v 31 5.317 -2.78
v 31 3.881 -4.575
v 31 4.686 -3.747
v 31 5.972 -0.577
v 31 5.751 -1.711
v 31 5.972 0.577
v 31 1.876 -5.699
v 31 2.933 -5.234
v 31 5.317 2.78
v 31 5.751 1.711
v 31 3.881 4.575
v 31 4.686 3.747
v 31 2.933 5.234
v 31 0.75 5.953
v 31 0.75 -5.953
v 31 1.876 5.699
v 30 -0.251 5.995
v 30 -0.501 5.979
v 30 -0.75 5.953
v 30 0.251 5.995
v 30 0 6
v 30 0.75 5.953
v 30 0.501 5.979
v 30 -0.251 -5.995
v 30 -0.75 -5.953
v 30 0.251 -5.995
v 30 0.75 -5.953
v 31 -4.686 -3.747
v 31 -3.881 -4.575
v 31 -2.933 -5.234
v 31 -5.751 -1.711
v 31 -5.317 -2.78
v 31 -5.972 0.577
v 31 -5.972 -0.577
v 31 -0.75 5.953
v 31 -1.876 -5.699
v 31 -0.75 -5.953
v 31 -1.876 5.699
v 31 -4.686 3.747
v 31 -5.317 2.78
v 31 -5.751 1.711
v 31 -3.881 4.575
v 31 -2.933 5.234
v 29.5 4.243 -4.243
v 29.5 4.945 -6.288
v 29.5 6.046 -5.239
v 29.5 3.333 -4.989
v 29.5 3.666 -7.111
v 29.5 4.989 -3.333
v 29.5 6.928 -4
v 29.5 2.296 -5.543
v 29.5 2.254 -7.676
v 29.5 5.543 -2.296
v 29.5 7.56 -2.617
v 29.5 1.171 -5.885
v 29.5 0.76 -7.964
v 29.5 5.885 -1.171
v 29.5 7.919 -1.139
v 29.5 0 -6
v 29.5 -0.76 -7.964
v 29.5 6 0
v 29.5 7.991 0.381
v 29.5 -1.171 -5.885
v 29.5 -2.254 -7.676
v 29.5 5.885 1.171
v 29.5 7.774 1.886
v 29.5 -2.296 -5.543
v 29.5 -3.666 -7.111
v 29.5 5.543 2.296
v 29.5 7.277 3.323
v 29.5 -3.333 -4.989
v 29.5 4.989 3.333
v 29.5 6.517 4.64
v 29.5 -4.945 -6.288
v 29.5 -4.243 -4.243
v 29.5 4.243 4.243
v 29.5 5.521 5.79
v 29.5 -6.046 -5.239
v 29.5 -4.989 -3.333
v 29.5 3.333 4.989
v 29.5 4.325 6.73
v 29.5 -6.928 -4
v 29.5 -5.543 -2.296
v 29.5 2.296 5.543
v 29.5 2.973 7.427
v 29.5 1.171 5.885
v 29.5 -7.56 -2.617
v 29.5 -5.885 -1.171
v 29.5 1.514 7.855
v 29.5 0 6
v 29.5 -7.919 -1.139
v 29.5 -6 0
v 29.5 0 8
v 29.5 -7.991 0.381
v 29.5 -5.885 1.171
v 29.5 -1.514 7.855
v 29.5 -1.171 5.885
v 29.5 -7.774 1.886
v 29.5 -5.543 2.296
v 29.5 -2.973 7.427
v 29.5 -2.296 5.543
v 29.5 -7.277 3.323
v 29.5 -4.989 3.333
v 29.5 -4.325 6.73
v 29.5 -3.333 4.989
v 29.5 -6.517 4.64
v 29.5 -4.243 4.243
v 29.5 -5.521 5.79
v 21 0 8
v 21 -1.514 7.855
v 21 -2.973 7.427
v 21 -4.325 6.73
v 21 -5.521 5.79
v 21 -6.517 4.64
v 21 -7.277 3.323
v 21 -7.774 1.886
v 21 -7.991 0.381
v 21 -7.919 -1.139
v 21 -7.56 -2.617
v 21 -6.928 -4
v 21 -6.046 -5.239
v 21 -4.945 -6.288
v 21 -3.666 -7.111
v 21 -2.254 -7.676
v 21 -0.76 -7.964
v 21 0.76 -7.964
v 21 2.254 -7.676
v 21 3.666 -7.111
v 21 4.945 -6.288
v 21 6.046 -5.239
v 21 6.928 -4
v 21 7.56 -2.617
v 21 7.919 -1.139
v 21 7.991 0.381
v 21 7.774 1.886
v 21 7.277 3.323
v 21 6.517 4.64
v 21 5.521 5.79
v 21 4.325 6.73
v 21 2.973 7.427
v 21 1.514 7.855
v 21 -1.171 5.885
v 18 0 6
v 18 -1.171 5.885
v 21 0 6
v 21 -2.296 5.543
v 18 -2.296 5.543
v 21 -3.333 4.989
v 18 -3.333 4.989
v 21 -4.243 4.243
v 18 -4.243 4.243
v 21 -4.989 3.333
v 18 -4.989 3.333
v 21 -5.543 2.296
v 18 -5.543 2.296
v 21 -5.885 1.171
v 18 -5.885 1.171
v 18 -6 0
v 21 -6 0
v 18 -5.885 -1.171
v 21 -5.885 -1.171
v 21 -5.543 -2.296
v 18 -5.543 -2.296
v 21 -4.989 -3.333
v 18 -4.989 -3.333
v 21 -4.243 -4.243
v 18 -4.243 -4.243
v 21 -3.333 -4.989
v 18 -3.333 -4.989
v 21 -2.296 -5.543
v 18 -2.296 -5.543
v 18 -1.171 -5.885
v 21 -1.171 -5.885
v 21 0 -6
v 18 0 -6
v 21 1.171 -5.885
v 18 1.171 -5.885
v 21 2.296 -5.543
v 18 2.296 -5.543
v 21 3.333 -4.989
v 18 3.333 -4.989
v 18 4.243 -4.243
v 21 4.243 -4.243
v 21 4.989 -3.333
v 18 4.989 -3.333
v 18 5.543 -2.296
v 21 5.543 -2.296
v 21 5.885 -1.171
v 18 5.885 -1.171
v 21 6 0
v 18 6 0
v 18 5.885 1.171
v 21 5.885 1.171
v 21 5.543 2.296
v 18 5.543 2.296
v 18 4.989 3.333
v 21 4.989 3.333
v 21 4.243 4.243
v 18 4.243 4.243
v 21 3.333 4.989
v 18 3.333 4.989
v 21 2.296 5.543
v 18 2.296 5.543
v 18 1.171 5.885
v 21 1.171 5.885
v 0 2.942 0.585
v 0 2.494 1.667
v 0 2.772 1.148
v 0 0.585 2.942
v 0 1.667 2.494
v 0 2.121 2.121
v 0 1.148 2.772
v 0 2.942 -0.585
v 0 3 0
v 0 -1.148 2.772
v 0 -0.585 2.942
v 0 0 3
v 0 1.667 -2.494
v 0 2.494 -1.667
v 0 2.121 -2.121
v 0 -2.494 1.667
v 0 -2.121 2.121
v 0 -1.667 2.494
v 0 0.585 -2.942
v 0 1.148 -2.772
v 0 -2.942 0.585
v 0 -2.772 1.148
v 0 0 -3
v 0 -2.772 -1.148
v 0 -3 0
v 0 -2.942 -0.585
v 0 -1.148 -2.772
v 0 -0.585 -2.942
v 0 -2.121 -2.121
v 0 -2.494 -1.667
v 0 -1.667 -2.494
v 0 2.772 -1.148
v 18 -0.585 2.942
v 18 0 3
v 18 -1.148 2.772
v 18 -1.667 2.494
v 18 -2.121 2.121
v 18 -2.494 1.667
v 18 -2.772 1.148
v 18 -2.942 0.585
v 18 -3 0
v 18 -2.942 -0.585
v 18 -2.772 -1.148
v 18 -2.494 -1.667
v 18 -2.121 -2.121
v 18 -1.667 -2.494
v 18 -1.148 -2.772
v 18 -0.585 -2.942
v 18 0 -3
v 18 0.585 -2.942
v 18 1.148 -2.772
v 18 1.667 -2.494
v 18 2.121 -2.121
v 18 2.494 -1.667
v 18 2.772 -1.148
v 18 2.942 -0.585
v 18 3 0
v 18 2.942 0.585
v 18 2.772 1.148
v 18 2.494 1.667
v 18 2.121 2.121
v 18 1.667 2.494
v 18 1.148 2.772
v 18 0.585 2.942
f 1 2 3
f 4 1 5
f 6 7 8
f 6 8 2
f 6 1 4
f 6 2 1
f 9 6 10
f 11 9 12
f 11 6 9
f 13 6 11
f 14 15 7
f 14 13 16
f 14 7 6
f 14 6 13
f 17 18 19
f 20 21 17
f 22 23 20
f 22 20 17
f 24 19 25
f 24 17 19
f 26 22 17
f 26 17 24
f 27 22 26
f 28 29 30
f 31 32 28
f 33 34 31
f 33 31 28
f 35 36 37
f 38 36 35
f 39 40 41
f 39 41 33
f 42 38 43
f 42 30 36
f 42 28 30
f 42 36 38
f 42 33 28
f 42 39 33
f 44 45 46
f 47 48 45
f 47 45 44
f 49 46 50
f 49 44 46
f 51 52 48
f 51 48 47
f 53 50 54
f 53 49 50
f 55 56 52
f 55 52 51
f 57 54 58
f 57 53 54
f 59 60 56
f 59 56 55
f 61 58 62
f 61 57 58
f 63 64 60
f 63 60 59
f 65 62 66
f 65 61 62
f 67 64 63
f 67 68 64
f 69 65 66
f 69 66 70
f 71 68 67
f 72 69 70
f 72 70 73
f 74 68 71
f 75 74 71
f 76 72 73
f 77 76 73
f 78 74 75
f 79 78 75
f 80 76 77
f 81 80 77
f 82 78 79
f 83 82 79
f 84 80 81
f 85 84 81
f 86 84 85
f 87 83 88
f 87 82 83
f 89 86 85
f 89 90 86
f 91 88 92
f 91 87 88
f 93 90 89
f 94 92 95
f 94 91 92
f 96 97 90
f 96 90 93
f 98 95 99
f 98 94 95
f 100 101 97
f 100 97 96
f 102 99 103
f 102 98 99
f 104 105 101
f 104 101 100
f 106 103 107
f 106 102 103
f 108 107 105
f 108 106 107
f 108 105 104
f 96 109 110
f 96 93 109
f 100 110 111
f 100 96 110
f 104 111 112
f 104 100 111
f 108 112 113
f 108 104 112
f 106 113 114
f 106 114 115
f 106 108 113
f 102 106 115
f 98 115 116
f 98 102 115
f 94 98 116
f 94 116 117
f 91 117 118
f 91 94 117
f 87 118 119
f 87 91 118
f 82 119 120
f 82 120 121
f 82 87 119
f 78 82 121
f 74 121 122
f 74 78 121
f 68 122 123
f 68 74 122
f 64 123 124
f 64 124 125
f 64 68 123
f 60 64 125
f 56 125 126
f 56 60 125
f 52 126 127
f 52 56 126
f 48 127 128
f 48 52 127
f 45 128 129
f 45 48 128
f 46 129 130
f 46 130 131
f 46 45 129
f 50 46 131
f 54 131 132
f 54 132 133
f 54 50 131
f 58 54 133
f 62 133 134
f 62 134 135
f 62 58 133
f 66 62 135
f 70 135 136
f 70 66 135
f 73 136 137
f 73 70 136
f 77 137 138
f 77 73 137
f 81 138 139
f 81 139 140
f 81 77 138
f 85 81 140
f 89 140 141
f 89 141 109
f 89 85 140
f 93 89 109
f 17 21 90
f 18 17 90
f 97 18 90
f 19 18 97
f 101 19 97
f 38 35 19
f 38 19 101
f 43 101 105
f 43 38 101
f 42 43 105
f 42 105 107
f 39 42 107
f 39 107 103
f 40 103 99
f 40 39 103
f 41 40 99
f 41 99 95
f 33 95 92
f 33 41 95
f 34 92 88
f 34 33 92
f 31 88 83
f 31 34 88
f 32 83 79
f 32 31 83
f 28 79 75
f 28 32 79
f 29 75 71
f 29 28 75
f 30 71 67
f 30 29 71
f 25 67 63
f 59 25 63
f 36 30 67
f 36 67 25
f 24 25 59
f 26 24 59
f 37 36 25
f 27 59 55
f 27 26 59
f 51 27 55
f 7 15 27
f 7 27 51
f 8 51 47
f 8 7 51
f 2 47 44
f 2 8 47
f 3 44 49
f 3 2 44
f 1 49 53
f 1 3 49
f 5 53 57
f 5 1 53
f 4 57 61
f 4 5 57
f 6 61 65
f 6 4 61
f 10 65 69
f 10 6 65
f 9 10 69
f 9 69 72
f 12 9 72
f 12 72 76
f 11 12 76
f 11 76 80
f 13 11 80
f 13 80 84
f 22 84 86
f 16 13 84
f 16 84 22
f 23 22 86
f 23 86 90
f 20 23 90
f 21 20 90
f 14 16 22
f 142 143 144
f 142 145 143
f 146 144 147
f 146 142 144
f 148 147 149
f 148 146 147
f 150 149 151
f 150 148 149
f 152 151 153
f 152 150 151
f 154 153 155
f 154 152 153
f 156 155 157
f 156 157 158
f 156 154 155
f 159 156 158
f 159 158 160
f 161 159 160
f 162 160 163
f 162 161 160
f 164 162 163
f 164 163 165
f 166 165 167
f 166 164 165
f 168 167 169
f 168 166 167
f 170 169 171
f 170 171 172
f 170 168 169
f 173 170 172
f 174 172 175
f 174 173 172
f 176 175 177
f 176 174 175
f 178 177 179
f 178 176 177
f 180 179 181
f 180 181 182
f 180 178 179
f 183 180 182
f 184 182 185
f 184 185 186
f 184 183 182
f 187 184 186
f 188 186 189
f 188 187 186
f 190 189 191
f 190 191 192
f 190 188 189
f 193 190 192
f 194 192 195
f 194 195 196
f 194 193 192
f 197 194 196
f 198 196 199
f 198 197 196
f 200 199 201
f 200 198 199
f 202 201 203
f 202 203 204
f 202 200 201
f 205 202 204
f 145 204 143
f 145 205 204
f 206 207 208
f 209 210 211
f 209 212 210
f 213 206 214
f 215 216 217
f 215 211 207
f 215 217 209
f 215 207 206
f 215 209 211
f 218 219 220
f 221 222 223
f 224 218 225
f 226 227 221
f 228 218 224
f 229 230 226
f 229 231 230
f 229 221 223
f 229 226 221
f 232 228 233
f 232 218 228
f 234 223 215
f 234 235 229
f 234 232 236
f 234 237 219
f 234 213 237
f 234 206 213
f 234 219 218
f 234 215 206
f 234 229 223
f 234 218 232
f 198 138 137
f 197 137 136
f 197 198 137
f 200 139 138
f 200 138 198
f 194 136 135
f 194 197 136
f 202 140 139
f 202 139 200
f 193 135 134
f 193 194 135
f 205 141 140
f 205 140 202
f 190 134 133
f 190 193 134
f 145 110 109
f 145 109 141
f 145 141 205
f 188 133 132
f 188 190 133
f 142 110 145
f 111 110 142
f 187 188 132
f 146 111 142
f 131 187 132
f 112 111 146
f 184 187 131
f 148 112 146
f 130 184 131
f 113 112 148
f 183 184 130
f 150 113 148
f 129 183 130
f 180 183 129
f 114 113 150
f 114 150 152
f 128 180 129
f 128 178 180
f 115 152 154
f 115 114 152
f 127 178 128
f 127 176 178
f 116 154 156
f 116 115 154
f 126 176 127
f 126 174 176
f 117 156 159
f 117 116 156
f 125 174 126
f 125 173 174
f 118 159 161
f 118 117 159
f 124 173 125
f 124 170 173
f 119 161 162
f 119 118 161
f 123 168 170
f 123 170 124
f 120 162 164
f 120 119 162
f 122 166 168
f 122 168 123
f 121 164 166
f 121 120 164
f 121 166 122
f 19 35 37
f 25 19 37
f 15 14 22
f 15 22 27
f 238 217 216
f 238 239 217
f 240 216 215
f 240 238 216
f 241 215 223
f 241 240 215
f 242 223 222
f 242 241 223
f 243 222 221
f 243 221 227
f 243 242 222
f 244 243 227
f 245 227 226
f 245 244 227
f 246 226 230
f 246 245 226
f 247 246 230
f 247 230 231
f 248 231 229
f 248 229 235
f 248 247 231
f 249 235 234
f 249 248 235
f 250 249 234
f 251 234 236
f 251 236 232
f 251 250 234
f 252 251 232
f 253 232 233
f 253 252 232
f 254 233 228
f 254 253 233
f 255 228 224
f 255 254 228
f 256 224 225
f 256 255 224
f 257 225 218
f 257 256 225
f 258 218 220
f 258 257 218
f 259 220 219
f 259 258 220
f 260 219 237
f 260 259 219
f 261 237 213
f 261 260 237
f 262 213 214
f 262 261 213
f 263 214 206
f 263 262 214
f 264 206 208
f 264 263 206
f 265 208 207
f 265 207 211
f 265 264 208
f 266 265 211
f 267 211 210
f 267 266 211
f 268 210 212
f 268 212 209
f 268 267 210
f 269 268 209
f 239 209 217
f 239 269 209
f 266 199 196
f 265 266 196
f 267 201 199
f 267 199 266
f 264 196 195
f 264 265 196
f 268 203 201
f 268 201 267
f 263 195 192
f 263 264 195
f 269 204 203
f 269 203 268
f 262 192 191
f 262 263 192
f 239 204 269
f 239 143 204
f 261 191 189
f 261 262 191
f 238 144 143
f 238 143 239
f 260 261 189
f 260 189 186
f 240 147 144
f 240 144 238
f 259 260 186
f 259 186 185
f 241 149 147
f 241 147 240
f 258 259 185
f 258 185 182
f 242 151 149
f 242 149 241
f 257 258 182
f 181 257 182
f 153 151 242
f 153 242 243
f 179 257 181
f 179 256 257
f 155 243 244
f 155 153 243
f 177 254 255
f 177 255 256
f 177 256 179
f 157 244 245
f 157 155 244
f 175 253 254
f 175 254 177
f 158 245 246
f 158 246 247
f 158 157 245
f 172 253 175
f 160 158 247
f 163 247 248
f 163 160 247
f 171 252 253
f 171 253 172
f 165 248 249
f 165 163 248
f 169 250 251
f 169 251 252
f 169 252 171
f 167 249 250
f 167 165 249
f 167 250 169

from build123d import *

# Parameters (mm, degrees)
SKETCH_2_W          = 16
SKETCH_2_H          = 1.5
CUT_EXTRUDE_1_DEPTH = 1


with BuildPart() as part:
    # Эскиз1 → Повернуть1 (revolve)
    with BuildSketch(Plane.XY, mode=Mode.PRIVATE) as revolve_1_sk:
        Polygon((0, 0), (0, 3), (18, 3), (18, 6), (21, 6), (21, 8), (29.5, 8), (29.5, 6), (31, 6), (31, 0), align=None)
    revolve(revolve_1_sk.sketch.rotate(Axis((0, 0, 0), (1, 0, 0)), 90), axis=Axis((0, 0, 0), (1, 0, 0)))

    # Эскиз2 → Вырез-Вытянуть1 (cut)
    with BuildSketch(Plane(origin=(31, 0, 0), x_dir=(0, 0, -1), z_dir=(1, 0, 0))):
        Rectangle(SKETCH_2_W, SKETCH_2_H)
    extrude(amount=-CUT_EXTRUDE_1_DEPTH, mode=Mode.SUBTRACT)


solid = part.part
